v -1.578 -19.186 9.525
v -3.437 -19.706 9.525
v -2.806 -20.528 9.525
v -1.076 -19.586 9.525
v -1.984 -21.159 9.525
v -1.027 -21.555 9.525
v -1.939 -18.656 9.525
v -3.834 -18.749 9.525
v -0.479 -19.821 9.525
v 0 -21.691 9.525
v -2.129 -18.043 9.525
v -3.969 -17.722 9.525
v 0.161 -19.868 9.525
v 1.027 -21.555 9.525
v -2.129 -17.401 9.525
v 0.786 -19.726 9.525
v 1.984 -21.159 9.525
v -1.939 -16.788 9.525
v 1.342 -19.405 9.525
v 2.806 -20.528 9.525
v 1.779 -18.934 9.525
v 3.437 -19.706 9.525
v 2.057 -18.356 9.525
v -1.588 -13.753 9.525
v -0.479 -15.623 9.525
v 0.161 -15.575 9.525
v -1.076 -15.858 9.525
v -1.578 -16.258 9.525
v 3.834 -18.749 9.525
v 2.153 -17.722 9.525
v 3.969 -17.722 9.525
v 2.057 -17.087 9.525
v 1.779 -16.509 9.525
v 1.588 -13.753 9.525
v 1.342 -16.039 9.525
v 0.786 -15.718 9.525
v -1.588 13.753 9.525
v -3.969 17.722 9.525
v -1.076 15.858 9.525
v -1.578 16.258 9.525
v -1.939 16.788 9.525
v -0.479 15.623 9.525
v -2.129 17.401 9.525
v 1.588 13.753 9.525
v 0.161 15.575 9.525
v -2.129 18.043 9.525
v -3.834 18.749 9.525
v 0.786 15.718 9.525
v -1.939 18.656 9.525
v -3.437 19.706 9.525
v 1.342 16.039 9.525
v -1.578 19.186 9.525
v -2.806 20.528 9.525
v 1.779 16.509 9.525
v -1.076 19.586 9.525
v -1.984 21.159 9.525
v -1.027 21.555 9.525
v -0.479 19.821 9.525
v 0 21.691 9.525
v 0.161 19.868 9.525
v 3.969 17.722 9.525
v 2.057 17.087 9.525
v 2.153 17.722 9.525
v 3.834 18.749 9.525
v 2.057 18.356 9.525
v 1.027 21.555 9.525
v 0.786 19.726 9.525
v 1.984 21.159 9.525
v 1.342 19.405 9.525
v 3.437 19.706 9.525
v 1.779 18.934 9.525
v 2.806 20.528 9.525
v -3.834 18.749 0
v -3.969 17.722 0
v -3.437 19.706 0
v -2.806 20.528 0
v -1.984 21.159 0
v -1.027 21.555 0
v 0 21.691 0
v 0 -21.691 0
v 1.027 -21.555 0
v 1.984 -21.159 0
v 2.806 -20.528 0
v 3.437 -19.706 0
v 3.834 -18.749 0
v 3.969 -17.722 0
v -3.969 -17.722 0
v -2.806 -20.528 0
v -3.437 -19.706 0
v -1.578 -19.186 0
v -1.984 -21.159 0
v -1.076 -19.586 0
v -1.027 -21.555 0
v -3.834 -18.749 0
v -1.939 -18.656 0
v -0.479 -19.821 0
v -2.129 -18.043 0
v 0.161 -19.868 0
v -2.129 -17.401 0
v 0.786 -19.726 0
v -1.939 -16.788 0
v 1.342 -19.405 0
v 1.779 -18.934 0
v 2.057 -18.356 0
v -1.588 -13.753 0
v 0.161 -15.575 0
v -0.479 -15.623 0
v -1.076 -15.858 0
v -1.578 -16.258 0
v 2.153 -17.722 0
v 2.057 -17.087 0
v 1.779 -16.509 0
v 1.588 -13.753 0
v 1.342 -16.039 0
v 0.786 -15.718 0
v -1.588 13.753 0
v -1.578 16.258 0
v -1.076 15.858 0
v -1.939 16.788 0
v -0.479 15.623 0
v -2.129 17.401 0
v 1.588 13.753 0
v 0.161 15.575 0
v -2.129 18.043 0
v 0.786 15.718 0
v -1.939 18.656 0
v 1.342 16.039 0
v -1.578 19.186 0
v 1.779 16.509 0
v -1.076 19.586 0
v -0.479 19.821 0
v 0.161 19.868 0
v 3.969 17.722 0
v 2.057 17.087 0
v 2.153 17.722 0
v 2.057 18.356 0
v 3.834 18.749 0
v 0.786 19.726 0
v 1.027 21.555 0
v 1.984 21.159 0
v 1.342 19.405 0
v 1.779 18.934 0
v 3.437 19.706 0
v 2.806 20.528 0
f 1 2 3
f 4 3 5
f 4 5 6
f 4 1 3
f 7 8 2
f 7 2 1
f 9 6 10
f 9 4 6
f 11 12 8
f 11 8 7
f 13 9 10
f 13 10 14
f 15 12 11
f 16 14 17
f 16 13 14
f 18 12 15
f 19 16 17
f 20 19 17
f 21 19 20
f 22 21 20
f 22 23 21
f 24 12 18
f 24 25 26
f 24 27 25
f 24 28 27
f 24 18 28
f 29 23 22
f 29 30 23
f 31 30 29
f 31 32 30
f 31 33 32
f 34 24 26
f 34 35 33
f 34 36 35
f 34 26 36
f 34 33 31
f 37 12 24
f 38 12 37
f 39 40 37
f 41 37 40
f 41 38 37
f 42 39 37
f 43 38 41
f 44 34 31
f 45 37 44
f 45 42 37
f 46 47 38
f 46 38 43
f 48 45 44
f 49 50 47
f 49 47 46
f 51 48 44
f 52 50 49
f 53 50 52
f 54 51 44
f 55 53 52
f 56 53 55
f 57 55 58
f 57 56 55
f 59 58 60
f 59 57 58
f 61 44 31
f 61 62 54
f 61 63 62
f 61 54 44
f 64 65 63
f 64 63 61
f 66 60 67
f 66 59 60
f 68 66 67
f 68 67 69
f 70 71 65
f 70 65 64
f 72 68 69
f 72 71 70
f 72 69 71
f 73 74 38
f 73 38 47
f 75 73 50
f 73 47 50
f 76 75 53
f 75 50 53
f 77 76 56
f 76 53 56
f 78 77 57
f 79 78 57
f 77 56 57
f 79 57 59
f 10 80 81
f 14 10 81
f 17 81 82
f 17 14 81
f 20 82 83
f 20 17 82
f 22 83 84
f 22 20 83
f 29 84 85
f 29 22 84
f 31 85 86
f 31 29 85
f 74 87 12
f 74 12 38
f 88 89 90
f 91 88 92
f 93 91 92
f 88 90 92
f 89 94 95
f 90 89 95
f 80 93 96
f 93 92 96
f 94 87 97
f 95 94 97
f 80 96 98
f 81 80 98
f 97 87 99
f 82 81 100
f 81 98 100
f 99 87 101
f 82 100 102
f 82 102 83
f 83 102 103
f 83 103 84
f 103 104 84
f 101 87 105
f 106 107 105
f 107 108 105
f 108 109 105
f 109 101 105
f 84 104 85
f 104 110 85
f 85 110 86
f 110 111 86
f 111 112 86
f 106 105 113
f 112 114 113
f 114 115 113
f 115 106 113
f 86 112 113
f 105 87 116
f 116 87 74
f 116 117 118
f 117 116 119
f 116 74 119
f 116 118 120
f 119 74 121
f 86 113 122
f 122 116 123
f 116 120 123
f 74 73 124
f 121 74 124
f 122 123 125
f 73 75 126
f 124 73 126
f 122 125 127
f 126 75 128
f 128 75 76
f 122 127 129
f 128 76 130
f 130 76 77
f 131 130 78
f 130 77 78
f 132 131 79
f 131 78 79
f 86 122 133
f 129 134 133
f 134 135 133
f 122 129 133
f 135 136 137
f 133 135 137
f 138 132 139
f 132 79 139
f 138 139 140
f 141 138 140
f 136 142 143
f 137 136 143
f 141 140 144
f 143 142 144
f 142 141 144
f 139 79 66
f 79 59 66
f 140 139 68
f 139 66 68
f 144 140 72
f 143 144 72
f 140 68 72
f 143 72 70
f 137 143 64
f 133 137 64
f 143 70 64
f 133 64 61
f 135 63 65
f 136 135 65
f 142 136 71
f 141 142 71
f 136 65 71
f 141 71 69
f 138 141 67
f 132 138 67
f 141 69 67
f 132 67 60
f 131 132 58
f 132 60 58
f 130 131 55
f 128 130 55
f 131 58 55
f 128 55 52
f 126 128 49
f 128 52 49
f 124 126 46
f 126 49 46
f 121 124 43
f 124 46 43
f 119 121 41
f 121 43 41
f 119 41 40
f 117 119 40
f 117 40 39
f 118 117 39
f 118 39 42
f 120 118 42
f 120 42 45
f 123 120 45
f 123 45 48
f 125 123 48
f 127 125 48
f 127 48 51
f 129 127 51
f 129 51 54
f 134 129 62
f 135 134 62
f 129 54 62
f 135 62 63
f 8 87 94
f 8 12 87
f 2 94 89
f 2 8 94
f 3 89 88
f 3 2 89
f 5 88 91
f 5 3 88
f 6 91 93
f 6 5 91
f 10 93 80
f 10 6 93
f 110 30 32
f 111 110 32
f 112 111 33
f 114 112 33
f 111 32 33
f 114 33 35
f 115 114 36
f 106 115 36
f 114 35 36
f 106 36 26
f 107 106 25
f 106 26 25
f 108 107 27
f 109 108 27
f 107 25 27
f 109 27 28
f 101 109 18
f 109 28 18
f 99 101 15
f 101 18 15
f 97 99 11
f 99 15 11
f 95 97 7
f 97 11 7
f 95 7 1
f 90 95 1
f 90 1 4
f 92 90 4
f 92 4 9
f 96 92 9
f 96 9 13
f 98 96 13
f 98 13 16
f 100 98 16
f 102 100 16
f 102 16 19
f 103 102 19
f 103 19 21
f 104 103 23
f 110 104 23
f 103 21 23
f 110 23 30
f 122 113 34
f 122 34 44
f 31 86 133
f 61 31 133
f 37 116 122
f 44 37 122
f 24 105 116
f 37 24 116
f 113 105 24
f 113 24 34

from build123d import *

# Parameters (mm, degrees)
F0_W     = 7.9375
F0_H     = 43.3812188
F0_W_2   = 3.175
F0_H_2   = 27.5062188
F1_DEPTH = 9.525
F2_R     = 2.15265
F3_DEPTH = 9.525
F4_R     = 3.96874


# Not quite as in the source:
# - a fillet or chamfer is up to 0.001 mm smaller than in the source, because OpenCascade refuses the exact size


with BuildPart() as f1:
    # F0 (on Top) → F1 (new body)
    with BuildSketch(Plane.XY):
        Rectangle(F0_W, F0_H)
        Rectangle(F0_W_2, F0_H_2, mode=Mode.SUBTRACT)
    extrude(amount=F1_DEPTH)

    # F2 (on face) → F3 (cut, through all)
    with BuildSketch(Plane.XY.offset(9.525)):
        with Locations((0, 17.7218594)):
            Circle(F2_R)
        with Locations((0, -17.7218594)):
            Circle(F2_R)
    extrude(amount=-F3_DEPTH, mode=Mode.SUBTRACT)

    # F4 (radius 3.96875 in the source; OpenCascade refuses exactly that, so slightly less here)
    f4_edges = [f1.edges().sort_by_distance(p)[0] for p in [
        (-3.96875, -21.690609, 4.7625),
        (3.96875, -21.690609, 4.7625),
        (3.96875, 21.690609, 4.7625),
        (-3.96875, 21.690609, 4.7625),
    ]]
    fillet(f4_edges, radius=F4_R)


solid = f1.part
